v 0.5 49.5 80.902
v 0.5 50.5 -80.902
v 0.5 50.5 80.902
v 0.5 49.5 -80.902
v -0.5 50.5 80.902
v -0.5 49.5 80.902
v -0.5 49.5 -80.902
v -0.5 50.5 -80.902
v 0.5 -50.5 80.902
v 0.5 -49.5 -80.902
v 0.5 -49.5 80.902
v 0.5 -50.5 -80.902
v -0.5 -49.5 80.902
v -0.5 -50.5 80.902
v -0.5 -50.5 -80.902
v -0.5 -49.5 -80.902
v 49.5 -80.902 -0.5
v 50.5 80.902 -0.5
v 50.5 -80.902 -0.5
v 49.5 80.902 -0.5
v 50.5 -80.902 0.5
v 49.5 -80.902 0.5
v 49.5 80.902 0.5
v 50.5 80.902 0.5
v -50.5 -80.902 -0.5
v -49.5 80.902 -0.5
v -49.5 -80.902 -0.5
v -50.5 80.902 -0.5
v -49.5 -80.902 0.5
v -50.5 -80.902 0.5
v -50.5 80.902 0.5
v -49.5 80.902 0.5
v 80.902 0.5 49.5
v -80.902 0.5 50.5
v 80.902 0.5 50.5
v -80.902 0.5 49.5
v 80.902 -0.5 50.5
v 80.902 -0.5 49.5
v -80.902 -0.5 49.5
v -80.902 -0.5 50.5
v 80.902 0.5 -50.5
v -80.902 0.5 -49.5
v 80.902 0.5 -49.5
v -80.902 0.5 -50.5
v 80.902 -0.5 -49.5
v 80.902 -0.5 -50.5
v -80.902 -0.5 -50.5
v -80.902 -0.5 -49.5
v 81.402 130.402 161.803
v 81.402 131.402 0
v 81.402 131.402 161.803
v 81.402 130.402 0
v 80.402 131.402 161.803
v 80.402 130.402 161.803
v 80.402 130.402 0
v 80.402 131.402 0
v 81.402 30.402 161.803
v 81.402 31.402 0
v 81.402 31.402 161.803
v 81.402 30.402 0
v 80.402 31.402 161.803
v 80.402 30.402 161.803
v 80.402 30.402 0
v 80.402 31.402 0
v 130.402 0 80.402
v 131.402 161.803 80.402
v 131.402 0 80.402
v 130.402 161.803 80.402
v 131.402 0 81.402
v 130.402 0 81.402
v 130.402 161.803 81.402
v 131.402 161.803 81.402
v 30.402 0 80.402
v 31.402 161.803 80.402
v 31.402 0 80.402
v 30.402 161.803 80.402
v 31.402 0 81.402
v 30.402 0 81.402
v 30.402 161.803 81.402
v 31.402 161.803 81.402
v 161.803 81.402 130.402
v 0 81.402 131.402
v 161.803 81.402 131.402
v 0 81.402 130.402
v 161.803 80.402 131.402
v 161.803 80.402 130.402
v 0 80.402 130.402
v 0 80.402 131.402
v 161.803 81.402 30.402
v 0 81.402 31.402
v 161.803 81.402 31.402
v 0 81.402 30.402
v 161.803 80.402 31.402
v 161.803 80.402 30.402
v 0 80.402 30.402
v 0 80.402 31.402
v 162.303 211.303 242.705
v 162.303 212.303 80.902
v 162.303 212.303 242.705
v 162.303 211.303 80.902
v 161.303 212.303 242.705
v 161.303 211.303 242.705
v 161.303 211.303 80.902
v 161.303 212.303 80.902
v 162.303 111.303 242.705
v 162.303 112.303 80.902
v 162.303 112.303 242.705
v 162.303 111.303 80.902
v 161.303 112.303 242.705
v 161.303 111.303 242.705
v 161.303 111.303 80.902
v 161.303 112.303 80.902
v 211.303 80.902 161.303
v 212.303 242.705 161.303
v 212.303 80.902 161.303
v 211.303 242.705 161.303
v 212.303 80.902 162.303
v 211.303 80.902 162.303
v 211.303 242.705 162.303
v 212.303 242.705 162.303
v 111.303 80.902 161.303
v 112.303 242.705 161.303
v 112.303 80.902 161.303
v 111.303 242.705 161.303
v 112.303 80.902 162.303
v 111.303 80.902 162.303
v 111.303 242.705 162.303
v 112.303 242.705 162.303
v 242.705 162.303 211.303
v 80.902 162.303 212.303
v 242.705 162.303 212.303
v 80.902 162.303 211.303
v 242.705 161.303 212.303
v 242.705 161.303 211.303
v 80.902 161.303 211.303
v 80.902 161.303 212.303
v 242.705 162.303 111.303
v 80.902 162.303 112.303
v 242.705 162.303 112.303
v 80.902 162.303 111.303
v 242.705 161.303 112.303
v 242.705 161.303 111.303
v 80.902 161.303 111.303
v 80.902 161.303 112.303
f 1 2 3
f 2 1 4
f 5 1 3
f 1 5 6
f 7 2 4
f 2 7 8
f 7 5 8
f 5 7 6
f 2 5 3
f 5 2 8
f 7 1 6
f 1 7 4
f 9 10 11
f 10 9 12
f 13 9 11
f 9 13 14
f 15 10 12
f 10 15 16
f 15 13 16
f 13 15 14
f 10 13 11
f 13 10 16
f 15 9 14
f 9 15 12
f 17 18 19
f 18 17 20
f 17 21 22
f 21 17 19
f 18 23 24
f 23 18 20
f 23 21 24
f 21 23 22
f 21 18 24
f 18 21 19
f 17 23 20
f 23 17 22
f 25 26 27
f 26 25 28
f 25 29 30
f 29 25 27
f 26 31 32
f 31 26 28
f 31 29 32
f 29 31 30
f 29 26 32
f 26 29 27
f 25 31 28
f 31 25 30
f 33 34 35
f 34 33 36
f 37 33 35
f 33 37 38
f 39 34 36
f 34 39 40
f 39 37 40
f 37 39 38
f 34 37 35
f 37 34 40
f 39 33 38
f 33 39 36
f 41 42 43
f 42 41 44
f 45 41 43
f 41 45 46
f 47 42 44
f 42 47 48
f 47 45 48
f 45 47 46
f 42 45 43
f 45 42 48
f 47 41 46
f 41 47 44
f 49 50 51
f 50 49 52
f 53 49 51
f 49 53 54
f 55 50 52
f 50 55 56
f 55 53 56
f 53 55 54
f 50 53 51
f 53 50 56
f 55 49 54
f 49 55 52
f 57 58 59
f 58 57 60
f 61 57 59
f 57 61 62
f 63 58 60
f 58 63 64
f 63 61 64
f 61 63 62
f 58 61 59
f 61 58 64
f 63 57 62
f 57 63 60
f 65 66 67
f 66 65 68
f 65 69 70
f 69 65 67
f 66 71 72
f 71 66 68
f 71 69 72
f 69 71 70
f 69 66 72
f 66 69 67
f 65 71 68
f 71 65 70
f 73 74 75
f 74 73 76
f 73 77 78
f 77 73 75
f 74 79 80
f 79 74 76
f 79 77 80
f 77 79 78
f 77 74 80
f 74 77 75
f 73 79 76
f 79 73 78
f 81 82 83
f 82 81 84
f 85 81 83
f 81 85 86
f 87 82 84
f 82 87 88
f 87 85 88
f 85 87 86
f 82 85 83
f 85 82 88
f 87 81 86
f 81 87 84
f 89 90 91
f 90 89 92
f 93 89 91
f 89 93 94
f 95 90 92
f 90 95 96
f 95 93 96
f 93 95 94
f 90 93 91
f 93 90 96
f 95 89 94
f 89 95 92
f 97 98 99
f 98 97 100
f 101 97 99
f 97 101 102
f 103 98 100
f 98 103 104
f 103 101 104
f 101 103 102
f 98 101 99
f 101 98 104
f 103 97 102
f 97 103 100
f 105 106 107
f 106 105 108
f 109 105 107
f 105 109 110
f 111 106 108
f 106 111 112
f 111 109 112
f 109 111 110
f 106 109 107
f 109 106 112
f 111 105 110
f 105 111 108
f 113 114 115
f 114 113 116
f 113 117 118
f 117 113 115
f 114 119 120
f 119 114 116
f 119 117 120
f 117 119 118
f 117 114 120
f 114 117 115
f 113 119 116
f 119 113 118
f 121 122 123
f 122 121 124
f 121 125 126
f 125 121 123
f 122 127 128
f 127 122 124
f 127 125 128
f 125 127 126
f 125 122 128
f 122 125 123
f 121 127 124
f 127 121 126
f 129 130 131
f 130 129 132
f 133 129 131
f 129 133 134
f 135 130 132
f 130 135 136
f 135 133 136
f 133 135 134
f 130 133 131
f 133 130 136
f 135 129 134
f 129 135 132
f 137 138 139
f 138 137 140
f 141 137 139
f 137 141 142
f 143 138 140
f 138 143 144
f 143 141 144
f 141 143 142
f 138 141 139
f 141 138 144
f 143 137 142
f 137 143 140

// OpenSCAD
/*  Make an Icosahedron

    Copyright © 2018 Simon Forman

    This file is part of Eumirion

    Eumirion is free software: you can redistribute it and/or modify
    it under the terms of the GNU General Public License as published by
    the Free Software Foundation, either version 3 of the License, or
    (at your option) any later version.

    Eumirion is distributed in the hope that it will be useful,
    but WITHOUT ANY WARRANTY; without even the implied warranty of
    MERCHANTABILITY or FITNESS FOR A PARTICULAR PURPOSE.  See the
    GNU General Public License for more details.

    You should have received a copy of the GNU General Public License
    along with Eumirion.  If not see <http://www.gnu.org/licenses/>.


The twelve verticies of an icosohedron form three Golden Rectangles.

 */


// The Golden Ratio of the long side to the short side is ~= 1.6180339...
phi = (1 + sqrt(5)) / 2;


R = 0.01;  // Very thin rods.


module golden_rectangle(n) {
    // Create a Golden Rectangle with short edge length of n.

    // In order to take the hull() of the rectangles they must actually
    // be very thin blocks.
    translate([0, n/2, 0]) {
        cube([n * R, n * R, n * phi], center=true);
    }
    translate([0, -n/2, 0]) {
        cube([n * R, n * R, n * phi], center=true);
    }
}

module rectangles(n) {
    // Create three Golden Rectangles and orient them into formation.
                        golden_rectangle(n);
    rotate([90, 90, 0]) golden_rectangle(n);
    rotate([90, 0, 90]) golden_rectangle(n);
}

module tri(n) {
    m = n * phi;
    polyhedron(
        points=[
        [n, m, 0],
        [m, 0, n],
        [0, n, m]],
        faces = [[0, 1, 2]]);
}
module foo(n) {tri(n); mirror()        tri(n);}
module bar(n) {foo(n); mirror([0,1,0]) foo(n);}
module baz(n) {bar(n); mirror([0,0,1]) bar(n);}

module icosa(n) {
    rectangles(n);
    %baz(n/2);
}

j = phi * 50;
icosa(100);
translate([j, j, j]) icosa(100);
k = 2 * j;
 translate([k, k, k]) icosa(100);
